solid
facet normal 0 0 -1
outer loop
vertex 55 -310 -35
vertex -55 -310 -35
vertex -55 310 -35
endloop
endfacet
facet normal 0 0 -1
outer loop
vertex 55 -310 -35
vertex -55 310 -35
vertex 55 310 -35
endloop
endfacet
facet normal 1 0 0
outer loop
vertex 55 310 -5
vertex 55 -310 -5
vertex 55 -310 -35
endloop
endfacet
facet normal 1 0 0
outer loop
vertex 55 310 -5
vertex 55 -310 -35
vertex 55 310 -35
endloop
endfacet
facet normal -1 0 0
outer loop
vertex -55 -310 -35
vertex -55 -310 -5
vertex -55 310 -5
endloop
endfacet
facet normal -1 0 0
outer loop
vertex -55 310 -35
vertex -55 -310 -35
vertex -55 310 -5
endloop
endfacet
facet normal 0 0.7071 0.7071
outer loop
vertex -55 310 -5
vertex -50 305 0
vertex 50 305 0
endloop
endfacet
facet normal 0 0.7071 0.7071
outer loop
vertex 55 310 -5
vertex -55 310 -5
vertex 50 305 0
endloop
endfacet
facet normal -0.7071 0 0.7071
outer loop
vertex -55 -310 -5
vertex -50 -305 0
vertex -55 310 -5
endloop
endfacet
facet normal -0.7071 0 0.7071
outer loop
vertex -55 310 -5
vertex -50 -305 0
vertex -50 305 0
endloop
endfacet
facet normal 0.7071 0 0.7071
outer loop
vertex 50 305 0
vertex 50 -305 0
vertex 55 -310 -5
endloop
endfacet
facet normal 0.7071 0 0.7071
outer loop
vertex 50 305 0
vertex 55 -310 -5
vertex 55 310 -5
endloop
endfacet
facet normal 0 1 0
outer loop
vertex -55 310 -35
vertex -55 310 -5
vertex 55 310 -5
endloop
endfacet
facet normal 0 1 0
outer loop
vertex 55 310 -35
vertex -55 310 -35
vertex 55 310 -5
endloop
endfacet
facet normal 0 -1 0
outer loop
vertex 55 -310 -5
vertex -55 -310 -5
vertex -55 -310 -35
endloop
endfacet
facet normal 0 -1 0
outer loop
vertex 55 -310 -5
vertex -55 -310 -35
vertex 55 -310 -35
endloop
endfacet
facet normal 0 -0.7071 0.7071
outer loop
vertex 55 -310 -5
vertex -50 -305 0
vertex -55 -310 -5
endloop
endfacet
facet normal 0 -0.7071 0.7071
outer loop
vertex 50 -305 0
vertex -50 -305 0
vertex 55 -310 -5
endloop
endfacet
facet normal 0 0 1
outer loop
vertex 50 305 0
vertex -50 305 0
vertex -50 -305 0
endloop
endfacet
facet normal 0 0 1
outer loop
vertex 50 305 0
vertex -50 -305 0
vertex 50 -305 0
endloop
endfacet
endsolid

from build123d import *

# Parameters (mm, degrees)
F1_W     = 110
F1_H     = 620
F2_DEPTH = 35
F3_SIZE  = 5


with BuildPart() as f2:
    # F1 (on Top) → F2 (new body)
    with BuildSketch(Plane.XY):
        Rectangle(F1_W, F1_H)
    extrude(amount=-F2_DEPTH)

    # F3
    f3_edges = [f2.edges().sort_by_distance(p)[0] for p in [
        (-55, 0, 0),
        (0, -310, 0),
        (55, 0, 0),
        (0, 310, 0),
    ]]
    chamfer(f3_edges, length=F3_SIZE)


solid = f2.part
